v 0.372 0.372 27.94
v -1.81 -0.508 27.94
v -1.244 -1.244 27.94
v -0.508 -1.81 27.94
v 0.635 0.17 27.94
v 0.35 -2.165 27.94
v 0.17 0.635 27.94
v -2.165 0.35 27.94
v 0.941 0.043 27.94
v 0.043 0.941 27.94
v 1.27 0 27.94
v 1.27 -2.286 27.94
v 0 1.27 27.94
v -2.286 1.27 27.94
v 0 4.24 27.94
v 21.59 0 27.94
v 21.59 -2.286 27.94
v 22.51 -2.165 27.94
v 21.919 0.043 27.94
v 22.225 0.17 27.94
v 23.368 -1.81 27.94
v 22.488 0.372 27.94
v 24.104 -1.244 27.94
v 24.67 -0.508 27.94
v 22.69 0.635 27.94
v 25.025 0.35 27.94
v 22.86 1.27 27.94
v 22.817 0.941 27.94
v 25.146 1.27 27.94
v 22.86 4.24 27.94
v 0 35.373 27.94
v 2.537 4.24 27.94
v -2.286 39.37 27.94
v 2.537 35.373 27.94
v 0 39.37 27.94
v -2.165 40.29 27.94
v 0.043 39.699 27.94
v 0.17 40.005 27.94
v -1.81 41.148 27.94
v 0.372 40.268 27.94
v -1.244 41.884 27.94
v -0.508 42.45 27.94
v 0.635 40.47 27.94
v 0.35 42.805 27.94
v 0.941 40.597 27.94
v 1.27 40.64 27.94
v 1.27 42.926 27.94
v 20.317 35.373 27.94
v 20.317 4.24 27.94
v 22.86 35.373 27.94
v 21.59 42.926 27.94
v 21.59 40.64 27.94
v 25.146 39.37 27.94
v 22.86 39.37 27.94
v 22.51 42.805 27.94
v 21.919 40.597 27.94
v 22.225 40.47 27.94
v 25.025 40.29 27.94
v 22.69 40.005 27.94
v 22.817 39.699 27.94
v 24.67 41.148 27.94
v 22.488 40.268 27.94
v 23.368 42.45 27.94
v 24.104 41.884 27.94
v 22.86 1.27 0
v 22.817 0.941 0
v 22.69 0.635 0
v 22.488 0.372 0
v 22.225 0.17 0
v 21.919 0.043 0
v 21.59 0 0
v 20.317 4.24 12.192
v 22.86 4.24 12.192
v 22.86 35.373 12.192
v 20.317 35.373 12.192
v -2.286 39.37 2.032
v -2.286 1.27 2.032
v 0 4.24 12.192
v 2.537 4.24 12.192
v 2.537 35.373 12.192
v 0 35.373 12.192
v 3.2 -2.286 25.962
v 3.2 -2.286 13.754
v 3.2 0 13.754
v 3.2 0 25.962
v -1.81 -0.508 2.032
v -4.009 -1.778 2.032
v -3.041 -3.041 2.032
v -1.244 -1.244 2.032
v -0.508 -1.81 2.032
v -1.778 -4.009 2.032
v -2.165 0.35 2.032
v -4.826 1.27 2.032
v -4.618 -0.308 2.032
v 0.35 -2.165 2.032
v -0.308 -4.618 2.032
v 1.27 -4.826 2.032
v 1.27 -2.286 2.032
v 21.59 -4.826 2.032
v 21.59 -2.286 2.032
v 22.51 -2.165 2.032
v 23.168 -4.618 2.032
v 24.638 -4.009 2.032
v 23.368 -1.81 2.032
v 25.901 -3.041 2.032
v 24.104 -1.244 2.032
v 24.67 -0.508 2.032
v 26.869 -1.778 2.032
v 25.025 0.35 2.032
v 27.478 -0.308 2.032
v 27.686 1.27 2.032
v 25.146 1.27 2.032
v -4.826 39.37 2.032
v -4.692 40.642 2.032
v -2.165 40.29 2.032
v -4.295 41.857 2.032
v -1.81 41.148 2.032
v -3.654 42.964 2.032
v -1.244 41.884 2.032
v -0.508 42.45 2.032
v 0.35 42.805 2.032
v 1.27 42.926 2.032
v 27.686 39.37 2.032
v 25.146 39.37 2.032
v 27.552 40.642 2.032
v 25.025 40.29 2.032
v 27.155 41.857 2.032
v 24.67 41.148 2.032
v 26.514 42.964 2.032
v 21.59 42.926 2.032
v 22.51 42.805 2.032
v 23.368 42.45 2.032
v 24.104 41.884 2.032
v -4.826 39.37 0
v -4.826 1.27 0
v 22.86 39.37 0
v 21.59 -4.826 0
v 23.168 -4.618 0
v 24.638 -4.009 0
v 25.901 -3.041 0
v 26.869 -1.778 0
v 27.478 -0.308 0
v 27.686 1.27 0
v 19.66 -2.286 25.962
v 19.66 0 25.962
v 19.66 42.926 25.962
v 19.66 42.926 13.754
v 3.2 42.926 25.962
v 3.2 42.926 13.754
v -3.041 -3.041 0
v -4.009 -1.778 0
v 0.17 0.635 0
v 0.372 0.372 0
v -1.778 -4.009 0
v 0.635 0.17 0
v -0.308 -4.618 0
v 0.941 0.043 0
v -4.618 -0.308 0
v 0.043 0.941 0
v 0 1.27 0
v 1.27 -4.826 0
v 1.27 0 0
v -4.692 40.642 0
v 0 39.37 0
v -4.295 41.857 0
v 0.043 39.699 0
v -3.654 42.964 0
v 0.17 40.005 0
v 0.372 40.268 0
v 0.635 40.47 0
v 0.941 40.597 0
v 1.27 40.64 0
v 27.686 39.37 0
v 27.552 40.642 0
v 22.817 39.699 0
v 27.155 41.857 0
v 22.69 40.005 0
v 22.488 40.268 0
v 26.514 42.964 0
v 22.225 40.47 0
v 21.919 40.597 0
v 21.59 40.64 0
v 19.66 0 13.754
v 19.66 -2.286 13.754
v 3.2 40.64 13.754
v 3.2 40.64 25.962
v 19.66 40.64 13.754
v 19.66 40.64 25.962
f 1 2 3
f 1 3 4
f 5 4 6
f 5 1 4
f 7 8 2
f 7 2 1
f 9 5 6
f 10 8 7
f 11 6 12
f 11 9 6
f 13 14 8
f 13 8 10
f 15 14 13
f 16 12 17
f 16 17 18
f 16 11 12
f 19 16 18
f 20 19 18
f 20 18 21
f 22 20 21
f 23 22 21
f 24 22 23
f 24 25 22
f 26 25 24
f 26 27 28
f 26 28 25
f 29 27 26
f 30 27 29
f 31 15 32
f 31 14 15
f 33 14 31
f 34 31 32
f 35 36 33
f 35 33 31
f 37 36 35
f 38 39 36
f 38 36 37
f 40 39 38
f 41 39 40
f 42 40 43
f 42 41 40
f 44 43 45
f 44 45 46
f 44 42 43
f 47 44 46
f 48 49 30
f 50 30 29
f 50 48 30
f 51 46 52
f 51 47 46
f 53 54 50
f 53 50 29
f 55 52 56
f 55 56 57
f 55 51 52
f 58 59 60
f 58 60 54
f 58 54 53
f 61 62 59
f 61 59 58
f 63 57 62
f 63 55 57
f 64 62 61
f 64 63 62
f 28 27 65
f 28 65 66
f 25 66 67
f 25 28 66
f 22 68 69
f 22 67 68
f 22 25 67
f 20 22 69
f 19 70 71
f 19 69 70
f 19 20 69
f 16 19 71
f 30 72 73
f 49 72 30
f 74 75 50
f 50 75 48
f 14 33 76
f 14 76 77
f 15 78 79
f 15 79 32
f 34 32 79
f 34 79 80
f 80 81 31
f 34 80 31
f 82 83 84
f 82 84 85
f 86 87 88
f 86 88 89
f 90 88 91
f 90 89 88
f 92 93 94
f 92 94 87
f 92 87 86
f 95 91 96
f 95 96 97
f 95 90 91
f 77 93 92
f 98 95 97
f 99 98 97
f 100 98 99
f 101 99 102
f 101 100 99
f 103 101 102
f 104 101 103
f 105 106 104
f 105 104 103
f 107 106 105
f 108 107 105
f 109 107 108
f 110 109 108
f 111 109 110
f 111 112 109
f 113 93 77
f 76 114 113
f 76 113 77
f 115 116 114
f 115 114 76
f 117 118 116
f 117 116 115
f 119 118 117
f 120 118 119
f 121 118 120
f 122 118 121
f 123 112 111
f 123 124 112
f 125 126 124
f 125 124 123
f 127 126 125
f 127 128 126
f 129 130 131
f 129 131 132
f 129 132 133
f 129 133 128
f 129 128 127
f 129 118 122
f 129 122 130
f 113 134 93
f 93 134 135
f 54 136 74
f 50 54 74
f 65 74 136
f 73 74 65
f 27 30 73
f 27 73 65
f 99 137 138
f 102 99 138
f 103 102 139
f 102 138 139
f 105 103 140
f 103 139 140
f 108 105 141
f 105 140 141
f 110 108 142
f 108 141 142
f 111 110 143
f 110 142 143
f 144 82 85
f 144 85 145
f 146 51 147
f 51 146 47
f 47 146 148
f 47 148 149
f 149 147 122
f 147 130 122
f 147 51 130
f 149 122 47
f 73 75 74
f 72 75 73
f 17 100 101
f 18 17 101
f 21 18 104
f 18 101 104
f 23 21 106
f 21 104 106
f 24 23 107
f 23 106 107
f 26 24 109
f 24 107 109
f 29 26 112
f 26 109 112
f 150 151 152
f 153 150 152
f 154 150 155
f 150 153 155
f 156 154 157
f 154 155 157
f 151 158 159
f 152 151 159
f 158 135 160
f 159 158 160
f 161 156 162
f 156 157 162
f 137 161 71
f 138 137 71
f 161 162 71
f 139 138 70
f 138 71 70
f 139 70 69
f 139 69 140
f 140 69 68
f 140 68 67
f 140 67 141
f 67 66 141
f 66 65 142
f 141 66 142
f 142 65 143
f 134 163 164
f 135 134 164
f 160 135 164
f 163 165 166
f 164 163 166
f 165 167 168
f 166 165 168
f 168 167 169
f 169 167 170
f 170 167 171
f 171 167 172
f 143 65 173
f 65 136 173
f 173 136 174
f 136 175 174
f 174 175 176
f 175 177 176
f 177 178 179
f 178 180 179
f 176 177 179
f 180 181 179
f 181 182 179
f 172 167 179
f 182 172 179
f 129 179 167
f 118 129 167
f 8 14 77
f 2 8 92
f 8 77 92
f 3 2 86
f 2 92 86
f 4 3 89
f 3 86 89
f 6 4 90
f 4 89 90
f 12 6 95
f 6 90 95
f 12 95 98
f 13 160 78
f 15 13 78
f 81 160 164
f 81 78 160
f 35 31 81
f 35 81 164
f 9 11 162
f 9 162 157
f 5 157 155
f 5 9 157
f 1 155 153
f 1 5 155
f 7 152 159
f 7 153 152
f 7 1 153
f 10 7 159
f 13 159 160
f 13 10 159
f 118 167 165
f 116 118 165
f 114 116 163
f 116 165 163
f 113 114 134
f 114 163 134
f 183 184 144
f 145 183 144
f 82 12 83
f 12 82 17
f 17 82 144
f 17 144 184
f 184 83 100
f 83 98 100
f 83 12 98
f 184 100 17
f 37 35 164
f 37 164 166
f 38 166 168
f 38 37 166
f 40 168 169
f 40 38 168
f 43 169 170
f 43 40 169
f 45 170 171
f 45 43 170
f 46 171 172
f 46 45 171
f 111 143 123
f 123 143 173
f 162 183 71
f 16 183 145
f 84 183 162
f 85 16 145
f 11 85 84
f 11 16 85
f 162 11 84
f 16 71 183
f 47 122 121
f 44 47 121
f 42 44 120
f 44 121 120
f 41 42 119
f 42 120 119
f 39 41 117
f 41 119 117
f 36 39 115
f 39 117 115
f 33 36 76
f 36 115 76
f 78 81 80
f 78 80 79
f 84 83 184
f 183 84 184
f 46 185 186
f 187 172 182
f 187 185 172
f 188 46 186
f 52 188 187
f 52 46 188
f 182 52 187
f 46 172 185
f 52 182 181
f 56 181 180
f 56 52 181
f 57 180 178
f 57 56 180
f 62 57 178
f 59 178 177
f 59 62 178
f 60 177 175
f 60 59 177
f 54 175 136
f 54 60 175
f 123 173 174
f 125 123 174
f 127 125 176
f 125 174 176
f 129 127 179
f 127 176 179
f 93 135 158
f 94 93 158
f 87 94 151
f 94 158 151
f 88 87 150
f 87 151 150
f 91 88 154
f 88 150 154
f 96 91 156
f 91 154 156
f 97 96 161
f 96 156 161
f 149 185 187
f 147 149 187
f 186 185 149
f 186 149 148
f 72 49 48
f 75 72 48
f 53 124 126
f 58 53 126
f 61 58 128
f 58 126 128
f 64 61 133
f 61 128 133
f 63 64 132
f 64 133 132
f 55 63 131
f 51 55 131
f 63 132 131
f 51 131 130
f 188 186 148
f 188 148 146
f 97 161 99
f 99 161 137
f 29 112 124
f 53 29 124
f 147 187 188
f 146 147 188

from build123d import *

# Parameters (mm, degrees)
F1_DEPTH  = 27.94
F2_W      = 16.4592
F2_H      = 12.2074130923
F3_DEPTH  = 57.9374
F5_DEPTH  = 2.032
F6_DEPTH  = 25.4
F7_W      = 31.1324808757
F7_H      = 15.748
F8_DEPTH  = 25.4
F9_W      = 17.78
F9_H      = 31.1324808757
F10_DEPTH = 42.926


with BuildPart() as f1:
    # F0 (on Top) → F1 (new body)
    with BuildSketch(Plane.XY):
        with BuildLine():
            Line((-2.2859999444, 39.37), (-2.2859999444, 1.27))
            ThreePointArc((-2.2859999444, 1.27), (-1.2444716746, -1.2444716746), (1.27, -2.2859999444))
            Line((1.27, -2.2859999444), (21.59, -2.2859999444))
            ThreePointArc((21.59, -2.2859999444), (24.1044716746, -1.2444716746), (25.1459999444, 1.27))
            Line((25.1459999444, 1.27), (25.1459999444, 39.37))
            ThreePointArc((25.1459999444, 39.37), (24.1044716746, 41.8844716746), (21.59, 42.9259999444))
            Line((21.59, 42.9259999444), (1.27, 42.9259999444))
            ThreePointArc((1.27, 42.9259999444), (-1.2444716746, 41.8844716746), (-2.2859999444, 39.37))
        make_face()
        with BuildLine():
            Line((21.59, 0), (1.27, 0))
            ThreePointArc((1.27, 0), (0.3719743879, 0.3719743879), (0, 1.27))
            Line((0, 1.27), (0, 39.37))
            ThreePointArc((0, 39.37), (0.3719743879, 40.2680256121), (1.27, 40.64))
            Line((1.27, 40.64), (21.59, 40.64))
            ThreePointArc((21.59, 40.64), (22.4880256121, 40.2680256121), (22.86, 39.37))
            Line((22.86, 39.37), (22.86, 1.27))
            ThreePointArc((22.86, 1.27), (22.4880256121, 0.3719743879), (21.59, 0))
        make_face(mode=Mode.SUBTRACT)
    extrude(amount=F1_DEPTH)

    # F2 (on face) → F3 (cut)
    with BuildSketch(Plane.XZ.offset(2.2859999444)):
        with Locations((11.43, 19.8580278084)):
            Rectangle(F2_W, F2_H)
    extrude(amount=-F3_DEPTH, mode=Mode.SUBTRACT)

    # F4 (on Top) → F5 (join)
    with BuildSketch(Plane.XY):
        with BuildLine():
            Line((1.0258011753, 42.9636910558), (-3.6540816908, 42.9636910558))
            ThreePointArc((-3.6540816908, 42.9636910558), (-4.5256185939, 41.2599738136), (-4.8259983516, 39.37))
            Line((-4.8259983516, 39.37), (-4.8259983516, 1.27))
            ThreePointArc((-4.8259983516, 1.27), (-3.0405217725, -3.0405217725), (1.27, -4.8259983516))
            Line((1.27, -4.8259983516), (21.59, -4.8259983516))
            ThreePointArc((21.59, -4.8259983516), (25.9005217725, -3.0405217725), (27.6859983516, 1.27))
            Line((27.6859983516, 1.27), (27.6859983516, 39.37))
            ThreePointArc((27.6859983516, 39.37), (27.3856185939, 41.2599738136), (26.5140816908, 42.9636910558))
            Line((26.5140816908, 42.9636910558), (1.0258011753, 42.9636910558))
        make_face()
    extrude(amount=F5_DEPTH)

    # F6 (cut): a face of the model
    f6_faces = [f1.faces().sort_by_distance(p)[0] for p in [
        (11.43, 20.32, 2.032),
    ]]
    extrude(f6_faces, amount=-F6_DEPTH, mode=Mode.SUBTRACT)

    # F7 (on face) → F8 (join)
    with BuildSketch(Plane(origin=(-2.2859999444, 0, 0), x_dir=(0, -1, 0), z_dir=(-1, 0, 0))):
        with Locations((-19.8064594535, 20.066)):
            Rectangle(F7_W, F7_H)
    extrude(amount=-F8_DEPTH)

    # F9 (on face) → F10 (cut)
    with BuildSketch(Plane.XY.offset(27.94)):
        with Locations((11.4274583516, 19.8064594535)):
            Rectangle(F9_W, F9_H)
    extrude(amount=-F10_DEPTH, mode=Mode.SUBTRACT)


solid = f1.part
